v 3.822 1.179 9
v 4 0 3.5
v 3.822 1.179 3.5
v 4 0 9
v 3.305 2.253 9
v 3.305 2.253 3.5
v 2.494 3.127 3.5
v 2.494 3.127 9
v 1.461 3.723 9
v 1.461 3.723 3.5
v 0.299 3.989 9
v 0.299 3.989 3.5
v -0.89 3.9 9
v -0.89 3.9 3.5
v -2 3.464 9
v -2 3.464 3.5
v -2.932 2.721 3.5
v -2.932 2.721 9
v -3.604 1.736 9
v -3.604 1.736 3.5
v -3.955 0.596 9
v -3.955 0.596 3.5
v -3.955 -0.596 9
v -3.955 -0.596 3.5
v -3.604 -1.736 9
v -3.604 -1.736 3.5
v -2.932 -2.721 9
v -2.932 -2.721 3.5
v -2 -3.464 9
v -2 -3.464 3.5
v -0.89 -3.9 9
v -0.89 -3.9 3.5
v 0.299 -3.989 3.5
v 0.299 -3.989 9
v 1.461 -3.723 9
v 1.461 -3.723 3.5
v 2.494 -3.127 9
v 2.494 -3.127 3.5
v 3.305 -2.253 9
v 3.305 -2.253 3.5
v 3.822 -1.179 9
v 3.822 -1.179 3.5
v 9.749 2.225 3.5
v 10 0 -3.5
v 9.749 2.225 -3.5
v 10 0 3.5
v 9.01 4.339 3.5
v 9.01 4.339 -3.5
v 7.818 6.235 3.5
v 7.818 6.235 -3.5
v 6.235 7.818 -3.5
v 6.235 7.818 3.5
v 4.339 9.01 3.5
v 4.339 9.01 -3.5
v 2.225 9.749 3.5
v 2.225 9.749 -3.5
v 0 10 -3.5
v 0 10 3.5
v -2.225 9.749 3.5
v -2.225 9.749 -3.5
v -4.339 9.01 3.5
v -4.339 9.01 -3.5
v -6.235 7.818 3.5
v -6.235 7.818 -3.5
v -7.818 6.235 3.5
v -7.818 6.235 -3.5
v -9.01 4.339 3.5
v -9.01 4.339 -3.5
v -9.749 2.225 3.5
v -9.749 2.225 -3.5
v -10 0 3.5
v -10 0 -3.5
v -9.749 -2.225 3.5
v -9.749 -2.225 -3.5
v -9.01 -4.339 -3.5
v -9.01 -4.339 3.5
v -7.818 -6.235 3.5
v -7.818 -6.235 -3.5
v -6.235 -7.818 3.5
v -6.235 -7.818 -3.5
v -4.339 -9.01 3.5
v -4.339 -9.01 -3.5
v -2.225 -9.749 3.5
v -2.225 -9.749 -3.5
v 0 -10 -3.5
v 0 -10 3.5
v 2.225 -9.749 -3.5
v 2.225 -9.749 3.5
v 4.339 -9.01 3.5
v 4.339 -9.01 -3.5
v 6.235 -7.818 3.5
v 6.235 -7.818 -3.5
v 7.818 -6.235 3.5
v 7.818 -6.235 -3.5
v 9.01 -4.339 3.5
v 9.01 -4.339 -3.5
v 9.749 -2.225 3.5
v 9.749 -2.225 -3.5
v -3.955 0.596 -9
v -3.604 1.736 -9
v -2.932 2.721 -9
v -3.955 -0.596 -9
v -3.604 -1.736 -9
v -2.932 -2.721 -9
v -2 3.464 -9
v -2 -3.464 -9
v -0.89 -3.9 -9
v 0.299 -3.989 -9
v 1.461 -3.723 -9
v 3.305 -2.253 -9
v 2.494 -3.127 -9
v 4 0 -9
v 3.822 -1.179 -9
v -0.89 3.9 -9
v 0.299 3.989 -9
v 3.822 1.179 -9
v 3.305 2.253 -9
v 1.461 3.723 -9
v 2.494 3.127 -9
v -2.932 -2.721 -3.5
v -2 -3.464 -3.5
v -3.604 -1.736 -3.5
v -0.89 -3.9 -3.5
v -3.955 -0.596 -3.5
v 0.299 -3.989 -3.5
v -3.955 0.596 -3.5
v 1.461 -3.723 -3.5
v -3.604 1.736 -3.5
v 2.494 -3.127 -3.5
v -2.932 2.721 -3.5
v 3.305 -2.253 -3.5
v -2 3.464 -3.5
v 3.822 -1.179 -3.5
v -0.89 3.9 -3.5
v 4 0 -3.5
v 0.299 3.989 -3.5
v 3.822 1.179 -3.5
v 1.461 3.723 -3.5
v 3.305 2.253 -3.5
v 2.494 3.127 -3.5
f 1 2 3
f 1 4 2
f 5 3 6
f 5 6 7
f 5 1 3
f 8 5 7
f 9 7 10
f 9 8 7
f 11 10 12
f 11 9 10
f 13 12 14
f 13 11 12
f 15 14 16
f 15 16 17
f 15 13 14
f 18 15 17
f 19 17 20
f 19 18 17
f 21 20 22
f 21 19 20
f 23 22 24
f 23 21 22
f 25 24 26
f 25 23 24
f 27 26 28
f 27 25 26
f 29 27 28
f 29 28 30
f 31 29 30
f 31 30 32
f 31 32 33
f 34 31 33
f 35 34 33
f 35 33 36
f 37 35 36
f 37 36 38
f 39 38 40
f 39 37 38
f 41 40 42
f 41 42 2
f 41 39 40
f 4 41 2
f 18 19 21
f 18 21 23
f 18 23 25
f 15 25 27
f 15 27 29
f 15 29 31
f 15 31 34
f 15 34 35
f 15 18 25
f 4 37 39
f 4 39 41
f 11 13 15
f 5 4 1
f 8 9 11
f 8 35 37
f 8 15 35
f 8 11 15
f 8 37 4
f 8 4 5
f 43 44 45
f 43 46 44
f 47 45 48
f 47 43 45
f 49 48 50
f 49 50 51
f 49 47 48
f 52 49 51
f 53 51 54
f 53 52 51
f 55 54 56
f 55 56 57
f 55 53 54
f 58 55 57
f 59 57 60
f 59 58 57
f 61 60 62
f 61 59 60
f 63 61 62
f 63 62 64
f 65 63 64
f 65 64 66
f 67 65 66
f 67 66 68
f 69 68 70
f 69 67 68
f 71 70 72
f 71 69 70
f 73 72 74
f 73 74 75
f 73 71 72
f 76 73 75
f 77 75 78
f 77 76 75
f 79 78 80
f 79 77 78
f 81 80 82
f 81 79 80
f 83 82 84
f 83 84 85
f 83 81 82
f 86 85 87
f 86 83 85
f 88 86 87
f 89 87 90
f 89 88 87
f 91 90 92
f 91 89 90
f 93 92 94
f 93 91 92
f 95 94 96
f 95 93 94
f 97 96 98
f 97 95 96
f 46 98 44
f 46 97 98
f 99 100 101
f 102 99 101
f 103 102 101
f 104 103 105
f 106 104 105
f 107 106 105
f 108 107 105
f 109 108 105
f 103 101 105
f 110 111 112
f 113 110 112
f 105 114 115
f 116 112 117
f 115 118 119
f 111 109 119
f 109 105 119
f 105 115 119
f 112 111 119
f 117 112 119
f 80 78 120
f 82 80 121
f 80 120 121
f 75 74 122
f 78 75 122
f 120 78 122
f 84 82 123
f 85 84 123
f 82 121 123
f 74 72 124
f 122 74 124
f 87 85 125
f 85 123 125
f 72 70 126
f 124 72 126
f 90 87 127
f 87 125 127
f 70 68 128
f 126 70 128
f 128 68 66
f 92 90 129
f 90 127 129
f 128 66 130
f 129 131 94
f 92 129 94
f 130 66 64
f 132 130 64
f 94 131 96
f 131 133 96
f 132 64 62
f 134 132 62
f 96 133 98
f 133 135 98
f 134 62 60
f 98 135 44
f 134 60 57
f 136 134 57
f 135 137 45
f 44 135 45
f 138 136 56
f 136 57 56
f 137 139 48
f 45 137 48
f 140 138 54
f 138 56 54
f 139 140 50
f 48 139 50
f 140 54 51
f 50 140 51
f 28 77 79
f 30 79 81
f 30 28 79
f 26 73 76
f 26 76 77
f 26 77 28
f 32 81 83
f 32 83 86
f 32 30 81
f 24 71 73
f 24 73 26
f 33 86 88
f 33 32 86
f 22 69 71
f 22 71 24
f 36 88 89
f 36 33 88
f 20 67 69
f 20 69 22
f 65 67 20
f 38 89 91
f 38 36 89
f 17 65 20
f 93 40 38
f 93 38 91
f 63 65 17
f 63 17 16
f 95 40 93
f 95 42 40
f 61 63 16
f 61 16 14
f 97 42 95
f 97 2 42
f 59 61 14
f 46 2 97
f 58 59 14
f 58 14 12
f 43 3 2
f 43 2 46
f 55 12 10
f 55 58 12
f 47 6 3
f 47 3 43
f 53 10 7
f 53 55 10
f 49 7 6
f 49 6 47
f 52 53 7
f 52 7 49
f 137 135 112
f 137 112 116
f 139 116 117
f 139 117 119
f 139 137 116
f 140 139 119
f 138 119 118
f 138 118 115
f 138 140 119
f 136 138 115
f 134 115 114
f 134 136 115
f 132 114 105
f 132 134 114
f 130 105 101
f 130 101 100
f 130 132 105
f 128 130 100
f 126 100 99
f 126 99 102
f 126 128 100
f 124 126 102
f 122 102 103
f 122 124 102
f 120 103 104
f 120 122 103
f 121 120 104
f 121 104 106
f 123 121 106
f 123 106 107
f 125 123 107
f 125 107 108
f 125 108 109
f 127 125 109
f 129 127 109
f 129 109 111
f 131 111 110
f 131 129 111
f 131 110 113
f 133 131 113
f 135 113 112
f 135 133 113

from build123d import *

# Parameters (mm, degrees)
SKETCH_1_R      = 4
EXTRUDE_2_DEPTH = 9
SKETCH_1_6_R    = 10
SKETCH_1_6_R_2  = 4
EXTRUDE_3_DEPTH = 3.5


with BuildPart() as part:
    # 草图1 → 凸台-拉伸2 (new, symmetric)
    with BuildSketch(Plane.XY):
        Circle(SKETCH_1_R)
    extrude(amount=EXTRUDE_2_DEPTH, both=True)

    # 草图1<6> → 凸台-拉伸3 (add, symmetric)
    with BuildSketch(Plane.XY):
        Circle(SKETCH_1_6_R)
        Circle(SKETCH_1_6_R_2, mode=Mode.SUBTRACT)
    extrude(amount=EXTRUDE_3_DEPTH, both=True)


solid = part.part
